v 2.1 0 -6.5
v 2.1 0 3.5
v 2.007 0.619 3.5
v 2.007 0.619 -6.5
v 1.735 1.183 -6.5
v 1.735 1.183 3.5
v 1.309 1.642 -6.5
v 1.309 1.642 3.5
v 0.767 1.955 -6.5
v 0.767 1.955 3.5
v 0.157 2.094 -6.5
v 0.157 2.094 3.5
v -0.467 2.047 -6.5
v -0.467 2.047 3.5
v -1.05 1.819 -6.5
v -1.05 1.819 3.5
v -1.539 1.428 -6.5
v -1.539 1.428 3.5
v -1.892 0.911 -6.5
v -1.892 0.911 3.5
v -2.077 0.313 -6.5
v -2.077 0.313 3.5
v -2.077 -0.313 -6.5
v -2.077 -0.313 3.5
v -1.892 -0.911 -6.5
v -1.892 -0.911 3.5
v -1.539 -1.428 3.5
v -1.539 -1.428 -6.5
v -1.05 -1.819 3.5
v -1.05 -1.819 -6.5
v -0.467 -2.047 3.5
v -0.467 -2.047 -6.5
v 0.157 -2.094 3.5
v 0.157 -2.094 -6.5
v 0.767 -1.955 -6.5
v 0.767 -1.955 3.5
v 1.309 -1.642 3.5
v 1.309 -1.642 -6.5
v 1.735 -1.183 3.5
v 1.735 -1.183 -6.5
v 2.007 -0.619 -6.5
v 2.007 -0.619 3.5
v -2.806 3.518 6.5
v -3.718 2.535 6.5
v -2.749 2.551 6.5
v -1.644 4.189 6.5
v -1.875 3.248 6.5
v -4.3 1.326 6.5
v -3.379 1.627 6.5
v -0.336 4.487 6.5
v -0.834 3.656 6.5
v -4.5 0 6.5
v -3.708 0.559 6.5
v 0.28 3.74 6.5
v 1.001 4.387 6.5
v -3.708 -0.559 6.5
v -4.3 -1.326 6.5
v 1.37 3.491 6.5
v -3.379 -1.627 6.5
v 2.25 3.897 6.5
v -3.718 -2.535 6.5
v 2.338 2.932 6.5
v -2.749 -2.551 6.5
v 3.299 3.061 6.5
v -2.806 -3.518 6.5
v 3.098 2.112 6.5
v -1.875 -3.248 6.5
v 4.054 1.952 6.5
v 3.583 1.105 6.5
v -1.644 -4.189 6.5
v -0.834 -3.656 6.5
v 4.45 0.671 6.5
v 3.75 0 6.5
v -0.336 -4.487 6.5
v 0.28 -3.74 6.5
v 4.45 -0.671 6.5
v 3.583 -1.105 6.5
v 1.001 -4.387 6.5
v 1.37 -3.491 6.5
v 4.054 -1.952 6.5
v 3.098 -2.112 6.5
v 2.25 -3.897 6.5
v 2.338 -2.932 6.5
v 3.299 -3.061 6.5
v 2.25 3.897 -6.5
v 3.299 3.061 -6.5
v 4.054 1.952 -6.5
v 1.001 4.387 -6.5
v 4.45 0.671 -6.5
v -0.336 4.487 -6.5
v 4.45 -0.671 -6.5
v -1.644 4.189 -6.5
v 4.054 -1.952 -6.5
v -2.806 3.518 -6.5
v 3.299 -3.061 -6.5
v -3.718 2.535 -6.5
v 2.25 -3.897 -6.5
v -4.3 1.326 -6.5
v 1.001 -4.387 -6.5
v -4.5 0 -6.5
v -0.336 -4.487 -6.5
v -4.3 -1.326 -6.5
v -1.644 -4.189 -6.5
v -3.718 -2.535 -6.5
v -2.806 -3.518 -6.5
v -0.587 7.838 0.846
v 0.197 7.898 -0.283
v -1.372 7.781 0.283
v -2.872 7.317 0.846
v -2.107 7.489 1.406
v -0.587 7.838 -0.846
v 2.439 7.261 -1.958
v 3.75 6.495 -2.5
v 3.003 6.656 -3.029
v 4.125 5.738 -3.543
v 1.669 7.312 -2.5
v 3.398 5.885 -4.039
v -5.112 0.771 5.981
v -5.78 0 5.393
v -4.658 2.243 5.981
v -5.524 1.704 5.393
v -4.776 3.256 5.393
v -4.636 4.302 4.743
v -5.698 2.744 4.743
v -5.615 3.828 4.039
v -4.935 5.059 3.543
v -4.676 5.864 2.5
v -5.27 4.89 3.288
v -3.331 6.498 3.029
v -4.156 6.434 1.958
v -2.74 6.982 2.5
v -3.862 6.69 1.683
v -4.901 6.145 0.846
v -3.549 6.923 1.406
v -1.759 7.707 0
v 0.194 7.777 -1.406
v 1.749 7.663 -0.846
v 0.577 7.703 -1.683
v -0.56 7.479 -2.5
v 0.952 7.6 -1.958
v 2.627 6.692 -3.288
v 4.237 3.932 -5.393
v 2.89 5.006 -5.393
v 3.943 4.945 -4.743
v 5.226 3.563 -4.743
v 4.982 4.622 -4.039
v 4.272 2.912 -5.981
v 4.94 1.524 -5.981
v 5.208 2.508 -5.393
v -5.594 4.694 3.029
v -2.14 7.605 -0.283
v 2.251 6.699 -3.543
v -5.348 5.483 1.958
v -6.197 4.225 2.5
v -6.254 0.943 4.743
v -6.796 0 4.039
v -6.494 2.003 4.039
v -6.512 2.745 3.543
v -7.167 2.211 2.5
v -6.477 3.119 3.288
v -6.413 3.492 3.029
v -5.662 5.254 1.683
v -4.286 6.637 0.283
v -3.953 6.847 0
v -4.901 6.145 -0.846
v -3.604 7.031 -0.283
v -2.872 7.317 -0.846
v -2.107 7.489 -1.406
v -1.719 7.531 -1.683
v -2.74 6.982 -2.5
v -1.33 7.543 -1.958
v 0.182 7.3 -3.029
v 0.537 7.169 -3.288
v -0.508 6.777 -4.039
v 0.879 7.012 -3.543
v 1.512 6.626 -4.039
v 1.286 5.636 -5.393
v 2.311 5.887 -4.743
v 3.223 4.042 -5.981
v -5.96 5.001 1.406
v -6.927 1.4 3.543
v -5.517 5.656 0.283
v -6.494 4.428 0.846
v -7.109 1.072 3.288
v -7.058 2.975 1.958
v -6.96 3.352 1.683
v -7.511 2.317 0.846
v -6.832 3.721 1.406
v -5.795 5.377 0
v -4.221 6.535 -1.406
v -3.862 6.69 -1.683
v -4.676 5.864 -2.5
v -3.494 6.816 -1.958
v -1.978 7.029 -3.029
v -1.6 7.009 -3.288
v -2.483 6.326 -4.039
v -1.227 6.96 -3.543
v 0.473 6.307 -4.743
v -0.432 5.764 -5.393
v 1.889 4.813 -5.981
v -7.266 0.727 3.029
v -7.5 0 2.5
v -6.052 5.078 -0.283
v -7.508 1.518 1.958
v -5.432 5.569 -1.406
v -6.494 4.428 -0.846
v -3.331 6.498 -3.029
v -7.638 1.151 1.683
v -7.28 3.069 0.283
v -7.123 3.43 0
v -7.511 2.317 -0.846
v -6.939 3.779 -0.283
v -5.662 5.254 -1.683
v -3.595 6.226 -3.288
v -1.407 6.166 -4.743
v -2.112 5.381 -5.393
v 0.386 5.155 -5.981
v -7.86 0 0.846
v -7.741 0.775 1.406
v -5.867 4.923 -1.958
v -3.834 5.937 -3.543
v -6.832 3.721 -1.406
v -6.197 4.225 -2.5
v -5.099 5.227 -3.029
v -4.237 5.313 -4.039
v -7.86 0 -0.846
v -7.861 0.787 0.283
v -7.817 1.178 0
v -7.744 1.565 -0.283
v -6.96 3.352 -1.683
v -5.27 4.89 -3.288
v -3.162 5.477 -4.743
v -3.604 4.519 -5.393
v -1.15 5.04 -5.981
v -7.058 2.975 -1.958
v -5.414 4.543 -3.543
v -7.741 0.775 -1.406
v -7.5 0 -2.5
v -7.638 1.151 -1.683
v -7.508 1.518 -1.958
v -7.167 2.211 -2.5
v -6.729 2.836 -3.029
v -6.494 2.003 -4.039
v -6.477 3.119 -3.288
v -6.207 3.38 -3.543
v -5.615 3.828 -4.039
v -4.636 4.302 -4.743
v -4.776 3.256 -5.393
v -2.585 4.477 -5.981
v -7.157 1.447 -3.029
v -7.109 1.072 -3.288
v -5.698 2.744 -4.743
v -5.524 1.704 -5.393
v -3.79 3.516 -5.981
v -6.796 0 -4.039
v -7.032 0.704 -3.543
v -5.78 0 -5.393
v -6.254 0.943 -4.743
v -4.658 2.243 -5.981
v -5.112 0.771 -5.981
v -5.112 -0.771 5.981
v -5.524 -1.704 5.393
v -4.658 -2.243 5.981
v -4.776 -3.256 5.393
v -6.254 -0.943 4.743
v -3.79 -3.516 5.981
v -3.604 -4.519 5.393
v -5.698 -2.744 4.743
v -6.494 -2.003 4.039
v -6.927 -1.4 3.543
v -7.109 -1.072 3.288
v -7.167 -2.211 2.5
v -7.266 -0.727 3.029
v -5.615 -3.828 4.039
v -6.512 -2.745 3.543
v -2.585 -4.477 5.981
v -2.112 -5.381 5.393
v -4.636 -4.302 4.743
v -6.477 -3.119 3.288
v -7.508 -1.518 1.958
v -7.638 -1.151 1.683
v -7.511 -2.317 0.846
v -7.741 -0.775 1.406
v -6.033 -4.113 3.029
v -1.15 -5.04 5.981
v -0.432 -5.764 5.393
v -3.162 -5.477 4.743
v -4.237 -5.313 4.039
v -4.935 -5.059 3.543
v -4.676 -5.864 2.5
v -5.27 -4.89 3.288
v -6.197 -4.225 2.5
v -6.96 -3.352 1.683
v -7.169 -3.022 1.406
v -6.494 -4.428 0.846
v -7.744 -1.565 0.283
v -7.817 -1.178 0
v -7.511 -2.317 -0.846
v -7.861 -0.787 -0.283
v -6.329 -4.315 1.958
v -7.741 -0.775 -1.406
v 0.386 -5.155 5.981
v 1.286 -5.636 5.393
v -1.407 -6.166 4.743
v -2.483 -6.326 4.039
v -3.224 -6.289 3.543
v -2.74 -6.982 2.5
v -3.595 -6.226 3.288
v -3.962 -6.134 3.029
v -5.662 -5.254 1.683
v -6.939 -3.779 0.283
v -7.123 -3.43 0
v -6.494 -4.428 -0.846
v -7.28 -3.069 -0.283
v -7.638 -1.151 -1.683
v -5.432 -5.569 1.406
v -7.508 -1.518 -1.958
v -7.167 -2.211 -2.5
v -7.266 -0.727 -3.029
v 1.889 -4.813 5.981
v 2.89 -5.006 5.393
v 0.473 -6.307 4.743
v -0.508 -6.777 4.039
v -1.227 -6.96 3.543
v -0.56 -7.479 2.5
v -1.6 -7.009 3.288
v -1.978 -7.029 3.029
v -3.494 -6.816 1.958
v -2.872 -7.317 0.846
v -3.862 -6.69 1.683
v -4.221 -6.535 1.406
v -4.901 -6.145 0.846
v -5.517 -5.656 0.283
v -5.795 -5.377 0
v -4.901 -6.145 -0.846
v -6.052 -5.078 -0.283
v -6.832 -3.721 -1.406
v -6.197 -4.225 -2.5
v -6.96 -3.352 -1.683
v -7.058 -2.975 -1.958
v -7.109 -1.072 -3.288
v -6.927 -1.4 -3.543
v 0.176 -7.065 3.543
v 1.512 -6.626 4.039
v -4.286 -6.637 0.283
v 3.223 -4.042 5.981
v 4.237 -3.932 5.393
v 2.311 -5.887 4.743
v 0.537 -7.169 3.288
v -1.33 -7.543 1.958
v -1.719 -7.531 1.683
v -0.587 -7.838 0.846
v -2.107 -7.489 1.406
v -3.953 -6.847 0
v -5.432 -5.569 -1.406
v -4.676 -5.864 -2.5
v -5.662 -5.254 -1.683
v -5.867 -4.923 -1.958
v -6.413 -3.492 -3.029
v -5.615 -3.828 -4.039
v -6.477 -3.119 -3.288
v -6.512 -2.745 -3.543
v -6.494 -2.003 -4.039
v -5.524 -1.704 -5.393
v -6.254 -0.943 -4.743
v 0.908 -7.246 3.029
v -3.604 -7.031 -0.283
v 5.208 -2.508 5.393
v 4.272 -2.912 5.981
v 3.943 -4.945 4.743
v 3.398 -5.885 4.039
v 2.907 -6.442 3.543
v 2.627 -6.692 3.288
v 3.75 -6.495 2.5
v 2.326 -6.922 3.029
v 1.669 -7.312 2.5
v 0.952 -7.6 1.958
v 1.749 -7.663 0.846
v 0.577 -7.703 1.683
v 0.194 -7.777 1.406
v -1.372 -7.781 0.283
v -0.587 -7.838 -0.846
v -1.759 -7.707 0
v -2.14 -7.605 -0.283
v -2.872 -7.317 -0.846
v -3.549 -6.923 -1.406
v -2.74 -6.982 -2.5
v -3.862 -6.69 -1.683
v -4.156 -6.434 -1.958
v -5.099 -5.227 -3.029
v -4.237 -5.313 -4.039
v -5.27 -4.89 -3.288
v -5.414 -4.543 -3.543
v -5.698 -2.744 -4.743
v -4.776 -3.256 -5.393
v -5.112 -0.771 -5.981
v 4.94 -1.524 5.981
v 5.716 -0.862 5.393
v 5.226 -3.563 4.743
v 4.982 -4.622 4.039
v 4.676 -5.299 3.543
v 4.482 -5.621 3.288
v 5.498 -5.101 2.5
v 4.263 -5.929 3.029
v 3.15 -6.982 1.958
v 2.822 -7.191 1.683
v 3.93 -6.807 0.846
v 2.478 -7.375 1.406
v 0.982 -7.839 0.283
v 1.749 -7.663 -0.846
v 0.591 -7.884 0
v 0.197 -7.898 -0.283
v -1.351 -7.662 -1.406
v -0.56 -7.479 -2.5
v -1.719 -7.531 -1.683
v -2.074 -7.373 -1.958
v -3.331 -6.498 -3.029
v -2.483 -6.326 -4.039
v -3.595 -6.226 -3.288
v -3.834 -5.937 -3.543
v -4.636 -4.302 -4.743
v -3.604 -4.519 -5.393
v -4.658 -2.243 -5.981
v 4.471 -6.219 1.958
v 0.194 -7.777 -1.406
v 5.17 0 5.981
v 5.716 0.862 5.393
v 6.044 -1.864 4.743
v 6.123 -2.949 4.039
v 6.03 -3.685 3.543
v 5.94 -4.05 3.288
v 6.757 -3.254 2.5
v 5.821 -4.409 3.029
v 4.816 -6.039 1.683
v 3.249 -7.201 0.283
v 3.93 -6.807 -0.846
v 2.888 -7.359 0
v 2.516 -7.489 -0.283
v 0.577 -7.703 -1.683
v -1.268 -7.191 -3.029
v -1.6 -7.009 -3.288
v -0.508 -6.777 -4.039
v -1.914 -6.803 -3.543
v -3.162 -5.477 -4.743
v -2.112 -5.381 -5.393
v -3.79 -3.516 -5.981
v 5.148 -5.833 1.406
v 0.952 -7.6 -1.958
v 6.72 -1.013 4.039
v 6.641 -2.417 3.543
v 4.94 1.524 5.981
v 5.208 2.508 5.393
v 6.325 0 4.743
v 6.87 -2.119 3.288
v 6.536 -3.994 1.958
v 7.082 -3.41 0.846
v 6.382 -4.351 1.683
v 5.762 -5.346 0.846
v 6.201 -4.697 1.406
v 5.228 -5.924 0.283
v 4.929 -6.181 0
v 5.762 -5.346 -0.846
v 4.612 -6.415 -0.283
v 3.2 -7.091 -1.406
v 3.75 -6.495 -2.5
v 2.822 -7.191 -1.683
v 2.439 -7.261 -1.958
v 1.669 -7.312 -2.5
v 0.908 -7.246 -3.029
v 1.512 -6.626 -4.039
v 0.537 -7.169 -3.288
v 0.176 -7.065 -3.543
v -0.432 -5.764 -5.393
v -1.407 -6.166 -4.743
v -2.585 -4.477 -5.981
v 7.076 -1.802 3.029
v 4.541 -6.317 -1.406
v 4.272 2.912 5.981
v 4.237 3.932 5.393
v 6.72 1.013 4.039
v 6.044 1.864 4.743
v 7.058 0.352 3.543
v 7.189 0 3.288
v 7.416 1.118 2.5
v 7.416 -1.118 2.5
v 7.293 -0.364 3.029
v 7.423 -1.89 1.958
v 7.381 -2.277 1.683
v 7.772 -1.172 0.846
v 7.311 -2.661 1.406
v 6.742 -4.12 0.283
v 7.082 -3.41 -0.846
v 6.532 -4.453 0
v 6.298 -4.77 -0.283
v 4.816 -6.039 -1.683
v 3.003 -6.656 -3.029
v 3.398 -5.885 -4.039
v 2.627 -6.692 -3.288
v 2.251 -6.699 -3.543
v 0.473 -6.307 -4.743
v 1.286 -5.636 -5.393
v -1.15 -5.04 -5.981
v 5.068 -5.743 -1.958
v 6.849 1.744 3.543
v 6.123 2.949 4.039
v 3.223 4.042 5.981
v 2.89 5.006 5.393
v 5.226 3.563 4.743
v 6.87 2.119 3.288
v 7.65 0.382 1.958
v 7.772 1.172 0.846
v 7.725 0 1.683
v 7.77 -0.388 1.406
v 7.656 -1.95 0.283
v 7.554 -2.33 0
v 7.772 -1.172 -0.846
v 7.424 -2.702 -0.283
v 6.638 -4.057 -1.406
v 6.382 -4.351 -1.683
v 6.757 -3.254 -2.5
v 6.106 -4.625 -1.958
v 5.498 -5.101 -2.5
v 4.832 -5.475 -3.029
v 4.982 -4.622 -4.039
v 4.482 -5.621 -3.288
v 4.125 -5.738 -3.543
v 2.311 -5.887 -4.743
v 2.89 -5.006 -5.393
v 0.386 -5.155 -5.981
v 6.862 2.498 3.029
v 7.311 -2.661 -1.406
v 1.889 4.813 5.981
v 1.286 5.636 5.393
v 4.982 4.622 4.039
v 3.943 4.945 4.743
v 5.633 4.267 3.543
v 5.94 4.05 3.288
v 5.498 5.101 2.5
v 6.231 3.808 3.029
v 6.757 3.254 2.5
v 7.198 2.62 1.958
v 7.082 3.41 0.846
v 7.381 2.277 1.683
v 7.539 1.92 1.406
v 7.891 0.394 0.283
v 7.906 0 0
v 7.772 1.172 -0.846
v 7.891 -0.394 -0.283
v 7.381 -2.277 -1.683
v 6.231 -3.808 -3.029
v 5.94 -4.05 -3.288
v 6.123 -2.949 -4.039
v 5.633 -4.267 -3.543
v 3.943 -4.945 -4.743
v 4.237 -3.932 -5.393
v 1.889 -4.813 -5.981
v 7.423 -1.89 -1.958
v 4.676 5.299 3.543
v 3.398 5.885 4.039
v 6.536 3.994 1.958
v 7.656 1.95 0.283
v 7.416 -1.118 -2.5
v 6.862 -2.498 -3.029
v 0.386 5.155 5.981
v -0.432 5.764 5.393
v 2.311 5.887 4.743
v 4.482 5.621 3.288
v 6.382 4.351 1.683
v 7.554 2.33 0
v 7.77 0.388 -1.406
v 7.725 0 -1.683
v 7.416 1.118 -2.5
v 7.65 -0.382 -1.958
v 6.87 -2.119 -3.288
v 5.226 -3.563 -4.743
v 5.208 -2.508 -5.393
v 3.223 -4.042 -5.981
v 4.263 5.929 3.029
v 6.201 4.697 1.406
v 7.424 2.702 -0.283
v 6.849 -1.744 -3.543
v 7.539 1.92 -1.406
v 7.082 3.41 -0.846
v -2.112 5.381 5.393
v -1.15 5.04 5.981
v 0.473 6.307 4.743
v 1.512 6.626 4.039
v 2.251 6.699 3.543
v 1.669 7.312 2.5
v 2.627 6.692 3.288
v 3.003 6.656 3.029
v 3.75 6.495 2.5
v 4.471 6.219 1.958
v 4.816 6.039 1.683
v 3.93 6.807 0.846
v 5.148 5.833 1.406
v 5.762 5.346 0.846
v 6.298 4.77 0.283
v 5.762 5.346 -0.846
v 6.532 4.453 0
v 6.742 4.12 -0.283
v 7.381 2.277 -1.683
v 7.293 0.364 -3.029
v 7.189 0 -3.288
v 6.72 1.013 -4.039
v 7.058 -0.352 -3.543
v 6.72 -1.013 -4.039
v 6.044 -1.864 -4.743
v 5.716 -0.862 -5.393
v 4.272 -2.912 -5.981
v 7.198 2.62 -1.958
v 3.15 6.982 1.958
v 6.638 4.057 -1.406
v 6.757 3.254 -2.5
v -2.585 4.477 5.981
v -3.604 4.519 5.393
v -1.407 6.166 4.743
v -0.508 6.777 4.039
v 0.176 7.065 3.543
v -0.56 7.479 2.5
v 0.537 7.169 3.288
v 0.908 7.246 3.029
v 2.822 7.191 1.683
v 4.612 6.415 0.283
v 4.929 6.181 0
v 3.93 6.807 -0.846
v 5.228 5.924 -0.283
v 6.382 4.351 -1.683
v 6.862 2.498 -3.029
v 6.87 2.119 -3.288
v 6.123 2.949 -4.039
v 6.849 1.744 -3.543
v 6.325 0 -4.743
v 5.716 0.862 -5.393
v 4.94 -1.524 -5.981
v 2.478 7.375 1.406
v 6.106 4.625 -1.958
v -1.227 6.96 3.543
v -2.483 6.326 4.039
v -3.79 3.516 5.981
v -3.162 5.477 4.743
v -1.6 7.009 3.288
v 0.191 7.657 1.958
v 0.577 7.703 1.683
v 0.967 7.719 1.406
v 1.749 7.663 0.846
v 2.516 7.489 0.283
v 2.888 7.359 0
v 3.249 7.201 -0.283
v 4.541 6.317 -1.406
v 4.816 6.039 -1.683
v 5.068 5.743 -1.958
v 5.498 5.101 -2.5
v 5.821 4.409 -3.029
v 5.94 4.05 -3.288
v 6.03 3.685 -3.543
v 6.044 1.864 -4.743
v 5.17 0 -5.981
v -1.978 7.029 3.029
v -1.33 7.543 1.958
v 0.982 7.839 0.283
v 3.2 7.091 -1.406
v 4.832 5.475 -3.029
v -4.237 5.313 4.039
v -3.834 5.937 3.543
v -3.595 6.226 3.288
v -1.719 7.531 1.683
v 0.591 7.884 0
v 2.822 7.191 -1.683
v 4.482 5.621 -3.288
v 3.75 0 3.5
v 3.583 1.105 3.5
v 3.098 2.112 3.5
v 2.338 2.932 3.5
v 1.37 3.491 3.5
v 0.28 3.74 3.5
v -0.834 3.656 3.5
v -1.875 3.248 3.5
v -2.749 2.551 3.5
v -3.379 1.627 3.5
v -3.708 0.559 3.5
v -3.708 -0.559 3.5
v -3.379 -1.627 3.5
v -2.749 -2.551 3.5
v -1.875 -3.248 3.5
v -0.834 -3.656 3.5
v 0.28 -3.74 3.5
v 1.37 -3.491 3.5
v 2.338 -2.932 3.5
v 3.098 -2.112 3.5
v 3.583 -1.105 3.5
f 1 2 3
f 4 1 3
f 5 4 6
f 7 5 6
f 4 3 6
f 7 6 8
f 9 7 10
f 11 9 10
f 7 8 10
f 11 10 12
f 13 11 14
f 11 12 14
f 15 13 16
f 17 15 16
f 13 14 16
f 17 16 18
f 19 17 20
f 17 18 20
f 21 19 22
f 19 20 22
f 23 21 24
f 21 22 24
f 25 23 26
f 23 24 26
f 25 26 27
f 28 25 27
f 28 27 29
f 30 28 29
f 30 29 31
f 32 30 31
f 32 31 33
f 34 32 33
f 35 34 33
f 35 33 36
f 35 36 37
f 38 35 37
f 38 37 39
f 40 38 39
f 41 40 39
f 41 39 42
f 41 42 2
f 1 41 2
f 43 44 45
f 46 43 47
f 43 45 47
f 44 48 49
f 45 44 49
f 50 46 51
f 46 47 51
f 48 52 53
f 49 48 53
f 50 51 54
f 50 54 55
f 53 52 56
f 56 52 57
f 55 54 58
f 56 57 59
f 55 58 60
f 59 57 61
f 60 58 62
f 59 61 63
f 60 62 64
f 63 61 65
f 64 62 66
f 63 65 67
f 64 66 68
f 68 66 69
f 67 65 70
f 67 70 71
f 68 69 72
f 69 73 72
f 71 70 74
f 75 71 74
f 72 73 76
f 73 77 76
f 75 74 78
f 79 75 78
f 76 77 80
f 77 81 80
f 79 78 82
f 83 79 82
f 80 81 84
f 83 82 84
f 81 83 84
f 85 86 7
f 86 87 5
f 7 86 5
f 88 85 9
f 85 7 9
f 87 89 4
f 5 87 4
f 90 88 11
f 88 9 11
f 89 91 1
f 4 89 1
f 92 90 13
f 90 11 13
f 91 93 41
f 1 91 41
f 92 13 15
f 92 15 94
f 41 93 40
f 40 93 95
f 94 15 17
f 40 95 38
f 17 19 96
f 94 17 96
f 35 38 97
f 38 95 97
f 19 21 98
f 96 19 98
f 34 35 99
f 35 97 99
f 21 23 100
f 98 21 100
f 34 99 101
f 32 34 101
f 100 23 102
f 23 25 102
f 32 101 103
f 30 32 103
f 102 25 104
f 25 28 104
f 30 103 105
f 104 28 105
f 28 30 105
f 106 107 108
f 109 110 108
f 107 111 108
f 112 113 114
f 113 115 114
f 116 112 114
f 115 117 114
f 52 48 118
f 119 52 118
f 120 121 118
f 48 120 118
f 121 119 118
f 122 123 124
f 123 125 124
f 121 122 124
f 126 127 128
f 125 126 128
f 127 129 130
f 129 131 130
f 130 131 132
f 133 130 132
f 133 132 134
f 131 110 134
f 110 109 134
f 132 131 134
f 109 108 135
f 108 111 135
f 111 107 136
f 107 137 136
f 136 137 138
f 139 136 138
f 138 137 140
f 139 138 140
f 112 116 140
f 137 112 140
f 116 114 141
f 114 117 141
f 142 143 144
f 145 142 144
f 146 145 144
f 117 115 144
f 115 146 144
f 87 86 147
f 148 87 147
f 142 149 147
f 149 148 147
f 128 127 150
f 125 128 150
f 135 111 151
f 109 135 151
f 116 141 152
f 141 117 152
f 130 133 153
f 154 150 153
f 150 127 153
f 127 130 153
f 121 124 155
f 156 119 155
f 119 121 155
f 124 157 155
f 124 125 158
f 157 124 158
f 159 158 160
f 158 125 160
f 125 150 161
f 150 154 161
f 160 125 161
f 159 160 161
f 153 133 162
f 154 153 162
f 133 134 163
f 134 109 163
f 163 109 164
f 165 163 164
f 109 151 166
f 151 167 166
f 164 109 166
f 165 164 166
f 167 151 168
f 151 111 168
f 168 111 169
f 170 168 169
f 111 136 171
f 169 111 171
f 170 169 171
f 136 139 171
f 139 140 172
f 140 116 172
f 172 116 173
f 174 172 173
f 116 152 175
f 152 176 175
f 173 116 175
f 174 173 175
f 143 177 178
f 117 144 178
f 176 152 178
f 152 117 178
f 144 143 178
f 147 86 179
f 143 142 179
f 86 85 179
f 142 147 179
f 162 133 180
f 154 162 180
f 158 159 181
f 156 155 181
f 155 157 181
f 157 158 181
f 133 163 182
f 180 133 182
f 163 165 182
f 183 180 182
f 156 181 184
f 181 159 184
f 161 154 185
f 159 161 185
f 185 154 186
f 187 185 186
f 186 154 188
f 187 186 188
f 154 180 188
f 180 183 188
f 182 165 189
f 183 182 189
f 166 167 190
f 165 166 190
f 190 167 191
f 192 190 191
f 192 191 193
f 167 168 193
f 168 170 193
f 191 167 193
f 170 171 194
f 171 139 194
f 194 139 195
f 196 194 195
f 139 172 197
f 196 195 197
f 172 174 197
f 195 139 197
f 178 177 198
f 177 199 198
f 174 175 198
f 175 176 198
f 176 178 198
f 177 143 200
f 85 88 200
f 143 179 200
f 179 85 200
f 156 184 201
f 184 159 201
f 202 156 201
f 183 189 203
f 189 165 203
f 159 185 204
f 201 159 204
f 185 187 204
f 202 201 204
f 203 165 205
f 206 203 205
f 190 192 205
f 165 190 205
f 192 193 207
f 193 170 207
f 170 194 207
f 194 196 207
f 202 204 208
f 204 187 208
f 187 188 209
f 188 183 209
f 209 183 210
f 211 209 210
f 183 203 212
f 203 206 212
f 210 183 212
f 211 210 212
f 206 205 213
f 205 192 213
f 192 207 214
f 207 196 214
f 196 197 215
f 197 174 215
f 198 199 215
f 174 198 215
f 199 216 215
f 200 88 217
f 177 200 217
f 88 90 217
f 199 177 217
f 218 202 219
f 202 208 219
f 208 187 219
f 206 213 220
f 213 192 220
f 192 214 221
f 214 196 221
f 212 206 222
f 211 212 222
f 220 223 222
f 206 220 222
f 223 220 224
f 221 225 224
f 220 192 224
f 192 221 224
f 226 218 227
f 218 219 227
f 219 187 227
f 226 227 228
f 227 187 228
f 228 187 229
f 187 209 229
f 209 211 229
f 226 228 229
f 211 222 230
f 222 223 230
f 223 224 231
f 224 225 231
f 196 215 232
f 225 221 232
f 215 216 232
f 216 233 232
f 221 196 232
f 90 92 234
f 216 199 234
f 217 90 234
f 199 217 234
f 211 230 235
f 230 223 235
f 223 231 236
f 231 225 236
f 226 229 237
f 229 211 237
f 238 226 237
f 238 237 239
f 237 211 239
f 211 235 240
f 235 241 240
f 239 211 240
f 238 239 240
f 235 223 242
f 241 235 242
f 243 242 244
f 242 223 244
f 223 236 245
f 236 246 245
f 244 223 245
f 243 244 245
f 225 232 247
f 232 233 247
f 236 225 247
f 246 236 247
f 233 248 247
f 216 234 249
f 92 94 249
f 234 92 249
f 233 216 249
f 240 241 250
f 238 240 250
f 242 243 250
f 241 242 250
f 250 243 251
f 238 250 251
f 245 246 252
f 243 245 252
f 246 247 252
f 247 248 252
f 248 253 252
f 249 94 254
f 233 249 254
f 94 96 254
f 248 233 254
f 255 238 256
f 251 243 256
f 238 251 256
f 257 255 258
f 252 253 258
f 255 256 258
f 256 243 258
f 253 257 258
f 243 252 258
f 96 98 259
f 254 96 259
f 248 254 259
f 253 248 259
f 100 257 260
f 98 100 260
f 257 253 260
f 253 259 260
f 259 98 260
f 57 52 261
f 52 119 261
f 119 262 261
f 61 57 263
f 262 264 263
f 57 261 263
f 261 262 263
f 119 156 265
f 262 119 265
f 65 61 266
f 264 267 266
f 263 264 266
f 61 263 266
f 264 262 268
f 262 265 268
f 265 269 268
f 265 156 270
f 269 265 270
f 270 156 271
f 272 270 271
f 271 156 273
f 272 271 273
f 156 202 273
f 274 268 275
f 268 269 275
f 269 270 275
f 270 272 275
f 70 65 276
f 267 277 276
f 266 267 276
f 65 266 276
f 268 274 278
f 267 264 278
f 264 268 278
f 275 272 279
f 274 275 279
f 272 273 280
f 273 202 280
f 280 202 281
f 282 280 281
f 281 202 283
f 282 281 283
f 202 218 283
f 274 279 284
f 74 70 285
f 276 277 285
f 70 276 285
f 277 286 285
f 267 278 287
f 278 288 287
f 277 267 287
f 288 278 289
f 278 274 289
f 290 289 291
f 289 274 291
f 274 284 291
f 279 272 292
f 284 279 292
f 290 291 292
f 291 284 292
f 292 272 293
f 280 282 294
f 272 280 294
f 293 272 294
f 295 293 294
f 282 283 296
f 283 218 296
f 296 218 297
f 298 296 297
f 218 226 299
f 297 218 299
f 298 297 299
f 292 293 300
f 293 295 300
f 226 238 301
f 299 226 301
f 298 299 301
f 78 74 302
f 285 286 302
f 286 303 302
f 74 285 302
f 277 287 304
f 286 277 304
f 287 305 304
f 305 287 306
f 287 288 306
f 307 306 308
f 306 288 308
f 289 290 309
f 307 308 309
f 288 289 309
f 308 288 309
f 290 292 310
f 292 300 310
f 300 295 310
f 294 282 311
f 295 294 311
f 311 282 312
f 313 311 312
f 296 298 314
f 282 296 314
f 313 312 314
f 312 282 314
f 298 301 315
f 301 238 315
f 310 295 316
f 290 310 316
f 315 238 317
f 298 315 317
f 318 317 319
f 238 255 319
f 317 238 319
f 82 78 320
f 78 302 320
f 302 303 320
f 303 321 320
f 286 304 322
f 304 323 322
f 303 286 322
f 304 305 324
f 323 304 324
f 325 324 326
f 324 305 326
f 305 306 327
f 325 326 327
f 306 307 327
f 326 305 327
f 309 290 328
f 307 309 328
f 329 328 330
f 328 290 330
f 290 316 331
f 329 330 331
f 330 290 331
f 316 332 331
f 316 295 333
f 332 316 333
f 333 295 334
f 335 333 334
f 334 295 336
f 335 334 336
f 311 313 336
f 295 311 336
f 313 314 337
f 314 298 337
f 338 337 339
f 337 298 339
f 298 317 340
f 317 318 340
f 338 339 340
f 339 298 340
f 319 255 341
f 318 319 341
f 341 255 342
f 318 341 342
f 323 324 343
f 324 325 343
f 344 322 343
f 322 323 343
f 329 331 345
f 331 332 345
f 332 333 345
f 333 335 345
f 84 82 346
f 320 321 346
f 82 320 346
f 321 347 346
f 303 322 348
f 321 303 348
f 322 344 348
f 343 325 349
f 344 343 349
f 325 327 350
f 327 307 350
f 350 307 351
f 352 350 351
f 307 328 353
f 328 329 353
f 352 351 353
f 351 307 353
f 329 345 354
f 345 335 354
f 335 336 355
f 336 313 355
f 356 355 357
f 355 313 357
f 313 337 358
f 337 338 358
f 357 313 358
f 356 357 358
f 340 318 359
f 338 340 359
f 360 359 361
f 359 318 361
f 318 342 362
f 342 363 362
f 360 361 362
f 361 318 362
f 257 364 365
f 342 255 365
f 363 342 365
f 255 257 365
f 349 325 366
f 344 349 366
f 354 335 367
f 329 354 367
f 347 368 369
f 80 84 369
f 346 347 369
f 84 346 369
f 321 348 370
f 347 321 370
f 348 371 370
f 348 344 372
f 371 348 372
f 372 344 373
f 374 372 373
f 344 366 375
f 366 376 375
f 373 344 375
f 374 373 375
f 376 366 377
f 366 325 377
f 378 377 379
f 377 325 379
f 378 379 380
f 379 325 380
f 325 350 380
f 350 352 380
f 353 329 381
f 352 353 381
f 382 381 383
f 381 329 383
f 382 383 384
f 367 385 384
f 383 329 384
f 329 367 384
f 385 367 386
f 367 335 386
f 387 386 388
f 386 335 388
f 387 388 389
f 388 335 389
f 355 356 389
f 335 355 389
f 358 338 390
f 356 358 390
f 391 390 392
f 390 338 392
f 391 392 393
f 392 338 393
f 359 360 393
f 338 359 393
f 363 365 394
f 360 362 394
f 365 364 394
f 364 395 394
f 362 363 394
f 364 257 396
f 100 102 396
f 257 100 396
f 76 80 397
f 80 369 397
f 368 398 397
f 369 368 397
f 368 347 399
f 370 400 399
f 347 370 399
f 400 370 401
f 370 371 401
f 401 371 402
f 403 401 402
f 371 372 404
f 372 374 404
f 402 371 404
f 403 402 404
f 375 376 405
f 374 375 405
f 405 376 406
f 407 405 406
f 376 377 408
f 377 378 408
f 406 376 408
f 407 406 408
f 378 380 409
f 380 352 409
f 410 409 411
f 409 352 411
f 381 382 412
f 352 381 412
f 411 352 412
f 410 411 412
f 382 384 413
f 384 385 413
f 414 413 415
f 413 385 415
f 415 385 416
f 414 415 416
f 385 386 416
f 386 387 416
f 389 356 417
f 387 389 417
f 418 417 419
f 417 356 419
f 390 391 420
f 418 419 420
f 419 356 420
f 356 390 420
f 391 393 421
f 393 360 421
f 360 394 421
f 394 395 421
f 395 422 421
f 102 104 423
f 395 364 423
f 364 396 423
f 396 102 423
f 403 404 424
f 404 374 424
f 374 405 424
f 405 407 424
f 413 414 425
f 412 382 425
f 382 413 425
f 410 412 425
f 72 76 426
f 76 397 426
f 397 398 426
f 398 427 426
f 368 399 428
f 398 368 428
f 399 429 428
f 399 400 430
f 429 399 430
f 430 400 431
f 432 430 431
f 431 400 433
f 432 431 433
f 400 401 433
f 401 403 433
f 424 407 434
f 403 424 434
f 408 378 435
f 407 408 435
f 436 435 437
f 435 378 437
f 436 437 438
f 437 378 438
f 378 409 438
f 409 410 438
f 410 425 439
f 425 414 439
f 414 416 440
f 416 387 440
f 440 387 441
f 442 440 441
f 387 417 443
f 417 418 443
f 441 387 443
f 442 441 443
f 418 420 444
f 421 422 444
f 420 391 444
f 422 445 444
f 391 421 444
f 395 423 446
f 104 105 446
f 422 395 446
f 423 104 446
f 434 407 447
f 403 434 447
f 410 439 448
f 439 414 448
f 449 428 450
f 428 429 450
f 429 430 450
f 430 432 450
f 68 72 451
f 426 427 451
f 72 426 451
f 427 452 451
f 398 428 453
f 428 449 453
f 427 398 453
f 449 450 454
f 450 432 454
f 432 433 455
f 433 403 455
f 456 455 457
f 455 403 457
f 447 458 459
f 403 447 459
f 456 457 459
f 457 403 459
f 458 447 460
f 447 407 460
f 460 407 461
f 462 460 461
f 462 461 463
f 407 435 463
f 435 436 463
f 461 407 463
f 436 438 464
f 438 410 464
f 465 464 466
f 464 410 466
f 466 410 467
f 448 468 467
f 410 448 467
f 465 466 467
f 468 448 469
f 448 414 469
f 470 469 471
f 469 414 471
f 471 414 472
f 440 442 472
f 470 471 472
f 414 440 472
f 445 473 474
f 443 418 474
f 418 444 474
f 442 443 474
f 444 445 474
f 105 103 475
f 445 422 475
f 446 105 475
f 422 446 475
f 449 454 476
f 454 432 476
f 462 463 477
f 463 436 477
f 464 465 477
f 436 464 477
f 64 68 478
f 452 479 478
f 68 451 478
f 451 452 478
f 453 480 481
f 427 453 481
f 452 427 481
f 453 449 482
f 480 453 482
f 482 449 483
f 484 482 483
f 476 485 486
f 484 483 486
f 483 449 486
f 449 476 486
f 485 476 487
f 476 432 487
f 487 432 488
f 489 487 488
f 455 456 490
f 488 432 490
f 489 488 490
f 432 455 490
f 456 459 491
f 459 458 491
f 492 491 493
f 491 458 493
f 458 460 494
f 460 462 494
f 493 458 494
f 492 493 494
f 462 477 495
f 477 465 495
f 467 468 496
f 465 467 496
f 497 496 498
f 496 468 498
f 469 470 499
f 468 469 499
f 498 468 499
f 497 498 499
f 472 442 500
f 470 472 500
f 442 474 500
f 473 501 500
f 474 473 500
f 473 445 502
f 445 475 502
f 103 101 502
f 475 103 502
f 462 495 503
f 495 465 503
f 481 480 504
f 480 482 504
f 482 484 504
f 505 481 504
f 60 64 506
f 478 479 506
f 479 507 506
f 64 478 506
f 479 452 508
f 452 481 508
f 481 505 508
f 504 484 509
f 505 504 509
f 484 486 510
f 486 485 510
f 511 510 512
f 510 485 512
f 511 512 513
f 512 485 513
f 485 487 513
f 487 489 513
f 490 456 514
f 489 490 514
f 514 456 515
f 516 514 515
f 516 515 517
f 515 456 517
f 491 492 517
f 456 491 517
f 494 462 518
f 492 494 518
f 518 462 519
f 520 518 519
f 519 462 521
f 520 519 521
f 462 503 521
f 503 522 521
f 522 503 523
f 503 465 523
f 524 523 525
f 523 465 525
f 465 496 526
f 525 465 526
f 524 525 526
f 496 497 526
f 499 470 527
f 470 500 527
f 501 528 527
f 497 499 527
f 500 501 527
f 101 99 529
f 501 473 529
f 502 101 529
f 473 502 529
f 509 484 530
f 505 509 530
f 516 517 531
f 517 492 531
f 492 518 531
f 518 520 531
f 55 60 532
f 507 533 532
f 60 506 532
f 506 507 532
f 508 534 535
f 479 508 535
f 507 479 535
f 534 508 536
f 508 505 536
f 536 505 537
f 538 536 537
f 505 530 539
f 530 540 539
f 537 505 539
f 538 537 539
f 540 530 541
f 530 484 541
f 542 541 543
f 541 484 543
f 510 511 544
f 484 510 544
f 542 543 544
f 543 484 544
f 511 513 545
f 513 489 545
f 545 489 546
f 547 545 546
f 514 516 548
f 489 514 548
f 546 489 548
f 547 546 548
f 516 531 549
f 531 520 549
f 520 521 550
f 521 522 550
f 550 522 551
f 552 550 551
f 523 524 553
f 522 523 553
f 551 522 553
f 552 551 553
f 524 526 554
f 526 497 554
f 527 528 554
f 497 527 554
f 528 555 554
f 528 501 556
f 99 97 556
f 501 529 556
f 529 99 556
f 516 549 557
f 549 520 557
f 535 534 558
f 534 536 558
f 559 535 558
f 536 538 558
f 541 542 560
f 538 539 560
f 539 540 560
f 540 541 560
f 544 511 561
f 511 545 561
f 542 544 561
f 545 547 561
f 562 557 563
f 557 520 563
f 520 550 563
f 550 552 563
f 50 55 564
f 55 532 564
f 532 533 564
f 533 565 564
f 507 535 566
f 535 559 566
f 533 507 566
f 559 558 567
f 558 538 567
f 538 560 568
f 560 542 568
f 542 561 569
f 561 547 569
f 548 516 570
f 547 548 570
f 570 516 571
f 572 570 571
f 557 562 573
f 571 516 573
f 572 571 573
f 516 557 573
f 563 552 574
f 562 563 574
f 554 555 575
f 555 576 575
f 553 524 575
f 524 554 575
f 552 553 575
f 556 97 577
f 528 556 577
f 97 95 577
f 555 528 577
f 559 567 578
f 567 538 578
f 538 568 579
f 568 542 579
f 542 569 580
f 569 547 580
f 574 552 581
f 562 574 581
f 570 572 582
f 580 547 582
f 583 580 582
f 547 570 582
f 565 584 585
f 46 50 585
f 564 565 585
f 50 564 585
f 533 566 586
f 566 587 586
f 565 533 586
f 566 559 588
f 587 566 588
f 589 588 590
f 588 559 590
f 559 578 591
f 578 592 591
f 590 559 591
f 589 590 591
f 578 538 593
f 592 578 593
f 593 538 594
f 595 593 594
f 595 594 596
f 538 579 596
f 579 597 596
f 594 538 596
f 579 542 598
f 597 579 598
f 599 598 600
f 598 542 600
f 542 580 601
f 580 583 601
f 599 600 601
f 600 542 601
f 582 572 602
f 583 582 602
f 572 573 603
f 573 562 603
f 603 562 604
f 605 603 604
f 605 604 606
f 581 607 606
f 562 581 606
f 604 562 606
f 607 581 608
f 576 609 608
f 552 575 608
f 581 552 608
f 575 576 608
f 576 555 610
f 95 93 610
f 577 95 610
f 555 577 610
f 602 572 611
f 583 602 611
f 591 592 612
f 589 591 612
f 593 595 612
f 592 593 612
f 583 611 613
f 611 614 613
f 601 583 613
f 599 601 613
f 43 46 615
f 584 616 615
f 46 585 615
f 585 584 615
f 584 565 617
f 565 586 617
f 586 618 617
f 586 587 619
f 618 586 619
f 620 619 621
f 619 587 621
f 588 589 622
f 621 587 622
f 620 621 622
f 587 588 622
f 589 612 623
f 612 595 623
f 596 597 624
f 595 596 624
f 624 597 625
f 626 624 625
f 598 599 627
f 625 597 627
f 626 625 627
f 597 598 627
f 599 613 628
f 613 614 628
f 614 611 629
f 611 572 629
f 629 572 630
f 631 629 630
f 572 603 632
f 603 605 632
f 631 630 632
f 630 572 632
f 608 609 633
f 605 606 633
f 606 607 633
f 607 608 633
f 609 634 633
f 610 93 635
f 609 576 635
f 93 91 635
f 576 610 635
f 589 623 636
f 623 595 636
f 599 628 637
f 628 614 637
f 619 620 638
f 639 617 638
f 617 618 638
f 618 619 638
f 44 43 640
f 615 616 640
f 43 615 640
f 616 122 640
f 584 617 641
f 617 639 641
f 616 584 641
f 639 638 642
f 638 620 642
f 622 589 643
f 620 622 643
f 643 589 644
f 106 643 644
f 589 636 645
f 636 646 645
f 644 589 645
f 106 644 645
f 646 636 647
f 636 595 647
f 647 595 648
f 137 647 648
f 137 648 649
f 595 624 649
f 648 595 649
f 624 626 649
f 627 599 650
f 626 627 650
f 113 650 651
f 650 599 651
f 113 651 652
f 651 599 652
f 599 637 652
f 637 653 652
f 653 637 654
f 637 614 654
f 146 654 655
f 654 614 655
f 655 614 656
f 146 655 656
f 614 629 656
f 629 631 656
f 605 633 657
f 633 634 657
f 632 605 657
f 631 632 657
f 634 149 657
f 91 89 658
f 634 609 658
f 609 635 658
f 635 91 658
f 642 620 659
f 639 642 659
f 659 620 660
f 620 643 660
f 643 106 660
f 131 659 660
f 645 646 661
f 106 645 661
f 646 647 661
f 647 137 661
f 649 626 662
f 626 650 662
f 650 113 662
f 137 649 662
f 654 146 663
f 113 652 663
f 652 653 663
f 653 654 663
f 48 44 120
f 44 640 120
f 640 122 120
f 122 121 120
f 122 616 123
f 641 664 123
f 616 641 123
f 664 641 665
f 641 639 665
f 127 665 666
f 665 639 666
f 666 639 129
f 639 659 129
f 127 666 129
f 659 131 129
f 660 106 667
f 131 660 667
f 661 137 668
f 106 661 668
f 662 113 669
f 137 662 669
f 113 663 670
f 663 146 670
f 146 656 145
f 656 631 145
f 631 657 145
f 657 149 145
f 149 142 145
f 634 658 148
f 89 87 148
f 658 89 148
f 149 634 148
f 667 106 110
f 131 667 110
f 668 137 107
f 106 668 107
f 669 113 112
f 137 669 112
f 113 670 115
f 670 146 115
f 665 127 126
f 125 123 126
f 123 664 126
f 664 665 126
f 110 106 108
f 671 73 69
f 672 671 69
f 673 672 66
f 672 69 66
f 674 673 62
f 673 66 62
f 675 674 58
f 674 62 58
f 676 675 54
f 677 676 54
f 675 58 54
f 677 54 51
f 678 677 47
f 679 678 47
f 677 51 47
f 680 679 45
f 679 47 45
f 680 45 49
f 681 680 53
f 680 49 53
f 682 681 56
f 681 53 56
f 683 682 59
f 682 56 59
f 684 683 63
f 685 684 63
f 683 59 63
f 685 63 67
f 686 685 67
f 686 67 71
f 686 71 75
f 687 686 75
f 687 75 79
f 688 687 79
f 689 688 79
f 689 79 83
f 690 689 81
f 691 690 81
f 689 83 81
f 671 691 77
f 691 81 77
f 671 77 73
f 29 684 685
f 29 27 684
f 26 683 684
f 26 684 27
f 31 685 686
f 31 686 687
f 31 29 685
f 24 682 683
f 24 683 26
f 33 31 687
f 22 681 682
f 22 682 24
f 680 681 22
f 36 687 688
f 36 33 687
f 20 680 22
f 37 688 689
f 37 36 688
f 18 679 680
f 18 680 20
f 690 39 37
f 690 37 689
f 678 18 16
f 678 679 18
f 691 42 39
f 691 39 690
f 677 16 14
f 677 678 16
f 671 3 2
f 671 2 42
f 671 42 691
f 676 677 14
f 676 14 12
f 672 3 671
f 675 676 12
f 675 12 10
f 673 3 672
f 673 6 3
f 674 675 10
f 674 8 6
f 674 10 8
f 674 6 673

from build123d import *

# Parameters (mm, degrees)
F2_R     = 2.1
F3_DEPTH = 13.001
F2_R_2   = 3.75
F4_DEPTH = 3


with BuildPart() as f1:
    # F0 (on Front) → F1 (revolve)
    with BuildSketch(Plane.XZ):
        with BuildLine():
            Line((0, -6.5), (0, 6.5))
            Line((0, 6.5), (-4.5, 6.5))
            ThreePointArc((-4.5, 6.5), (-7.905694, 0), (-4.5, -6.5))
            Line((-4.5, -6.5), (0, -6.5))
        make_face()
    revolve(axis=Axis((0, 0, 0), (0, 0, 1)))

    # F2 (on face) → F3 (cut, through all)
    with BuildSketch(Plane.XY.offset(6.5)):
        Circle(F2_R)
    extrude(amount=-F3_DEPTH, mode=Mode.SUBTRACT)

    # F2 (on face) → F4 (cut)
    with BuildSketch(Plane.XY.offset(6.5)):
        Circle(F2_R_2)
        Circle(F2_R, mode=Mode.SUBTRACT)
    extrude(amount=-F4_DEPTH, mode=Mode.SUBTRACT)


solid = f1.part
